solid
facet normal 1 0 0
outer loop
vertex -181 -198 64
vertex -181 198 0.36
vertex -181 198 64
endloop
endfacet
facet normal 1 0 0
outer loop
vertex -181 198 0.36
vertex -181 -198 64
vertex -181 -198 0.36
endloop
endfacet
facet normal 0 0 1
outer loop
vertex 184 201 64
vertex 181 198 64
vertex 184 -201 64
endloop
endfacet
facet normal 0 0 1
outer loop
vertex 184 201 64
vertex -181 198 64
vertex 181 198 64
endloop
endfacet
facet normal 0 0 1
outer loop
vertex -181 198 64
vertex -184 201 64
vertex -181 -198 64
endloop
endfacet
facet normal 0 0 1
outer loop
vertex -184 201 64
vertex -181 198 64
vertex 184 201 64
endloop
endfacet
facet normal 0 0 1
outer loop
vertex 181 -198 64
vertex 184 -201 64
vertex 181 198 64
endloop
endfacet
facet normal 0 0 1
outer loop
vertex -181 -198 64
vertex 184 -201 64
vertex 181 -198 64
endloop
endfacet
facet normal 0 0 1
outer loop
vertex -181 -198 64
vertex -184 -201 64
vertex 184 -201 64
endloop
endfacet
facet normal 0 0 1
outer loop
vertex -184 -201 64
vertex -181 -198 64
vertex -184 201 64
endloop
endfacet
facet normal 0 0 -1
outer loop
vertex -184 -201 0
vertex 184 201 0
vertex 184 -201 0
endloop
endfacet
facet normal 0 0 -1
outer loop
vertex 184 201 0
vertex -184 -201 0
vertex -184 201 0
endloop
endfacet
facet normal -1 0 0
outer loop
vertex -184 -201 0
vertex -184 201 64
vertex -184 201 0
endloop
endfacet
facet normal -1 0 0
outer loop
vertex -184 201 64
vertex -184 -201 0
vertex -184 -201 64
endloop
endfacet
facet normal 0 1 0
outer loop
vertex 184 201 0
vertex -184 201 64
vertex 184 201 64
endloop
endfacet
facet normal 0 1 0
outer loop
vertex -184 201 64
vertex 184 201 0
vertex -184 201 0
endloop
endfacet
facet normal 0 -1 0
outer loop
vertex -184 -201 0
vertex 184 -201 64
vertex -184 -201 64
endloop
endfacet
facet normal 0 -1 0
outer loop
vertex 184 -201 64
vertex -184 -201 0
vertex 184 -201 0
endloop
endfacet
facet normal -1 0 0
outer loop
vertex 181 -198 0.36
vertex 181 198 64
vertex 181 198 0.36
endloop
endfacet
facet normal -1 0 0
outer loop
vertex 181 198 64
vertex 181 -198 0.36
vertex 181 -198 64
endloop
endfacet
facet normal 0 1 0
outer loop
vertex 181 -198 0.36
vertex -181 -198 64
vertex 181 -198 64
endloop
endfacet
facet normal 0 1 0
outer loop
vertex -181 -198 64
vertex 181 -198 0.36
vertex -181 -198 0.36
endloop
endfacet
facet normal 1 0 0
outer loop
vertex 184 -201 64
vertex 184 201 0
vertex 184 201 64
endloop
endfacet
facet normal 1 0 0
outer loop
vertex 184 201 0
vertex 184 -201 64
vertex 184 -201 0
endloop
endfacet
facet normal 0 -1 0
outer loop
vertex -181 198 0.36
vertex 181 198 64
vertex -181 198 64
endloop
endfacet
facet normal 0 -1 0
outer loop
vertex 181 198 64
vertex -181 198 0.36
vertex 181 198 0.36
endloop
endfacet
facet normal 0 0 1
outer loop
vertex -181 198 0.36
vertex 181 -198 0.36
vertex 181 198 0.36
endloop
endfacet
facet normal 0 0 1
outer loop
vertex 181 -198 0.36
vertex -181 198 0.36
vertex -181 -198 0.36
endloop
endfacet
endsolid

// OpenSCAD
// Dimensions are in millimetres. The origin is on the bench at X 334, Y 0.
// Cut two 402 x 64 panels and two 362 x 64 panels from clear 3 mm stock.
// Seal the wet-side seams above a continuous waterproof film floor.

tray_x = 368;
tray_y = 402;
wall = 3;
height = 64;
floor = 0.36;

color([0.40, 0.65, 0.68, 0.30]) {
    translate([-tray_x / 2, -tray_y / 2, 0]) cube([tray_x, tray_y, floor]);

    for (side = [-1, 1]) {
        translate([side * (tray_x - wall) / 2, 0, height / 2])
            cube([wall, tray_y, height], center = true);

        translate([0, side * (tray_y - wall) / 2, height / 2])
            cube([tray_x - 2 * wall, wall, height], center = true);
    }
}
